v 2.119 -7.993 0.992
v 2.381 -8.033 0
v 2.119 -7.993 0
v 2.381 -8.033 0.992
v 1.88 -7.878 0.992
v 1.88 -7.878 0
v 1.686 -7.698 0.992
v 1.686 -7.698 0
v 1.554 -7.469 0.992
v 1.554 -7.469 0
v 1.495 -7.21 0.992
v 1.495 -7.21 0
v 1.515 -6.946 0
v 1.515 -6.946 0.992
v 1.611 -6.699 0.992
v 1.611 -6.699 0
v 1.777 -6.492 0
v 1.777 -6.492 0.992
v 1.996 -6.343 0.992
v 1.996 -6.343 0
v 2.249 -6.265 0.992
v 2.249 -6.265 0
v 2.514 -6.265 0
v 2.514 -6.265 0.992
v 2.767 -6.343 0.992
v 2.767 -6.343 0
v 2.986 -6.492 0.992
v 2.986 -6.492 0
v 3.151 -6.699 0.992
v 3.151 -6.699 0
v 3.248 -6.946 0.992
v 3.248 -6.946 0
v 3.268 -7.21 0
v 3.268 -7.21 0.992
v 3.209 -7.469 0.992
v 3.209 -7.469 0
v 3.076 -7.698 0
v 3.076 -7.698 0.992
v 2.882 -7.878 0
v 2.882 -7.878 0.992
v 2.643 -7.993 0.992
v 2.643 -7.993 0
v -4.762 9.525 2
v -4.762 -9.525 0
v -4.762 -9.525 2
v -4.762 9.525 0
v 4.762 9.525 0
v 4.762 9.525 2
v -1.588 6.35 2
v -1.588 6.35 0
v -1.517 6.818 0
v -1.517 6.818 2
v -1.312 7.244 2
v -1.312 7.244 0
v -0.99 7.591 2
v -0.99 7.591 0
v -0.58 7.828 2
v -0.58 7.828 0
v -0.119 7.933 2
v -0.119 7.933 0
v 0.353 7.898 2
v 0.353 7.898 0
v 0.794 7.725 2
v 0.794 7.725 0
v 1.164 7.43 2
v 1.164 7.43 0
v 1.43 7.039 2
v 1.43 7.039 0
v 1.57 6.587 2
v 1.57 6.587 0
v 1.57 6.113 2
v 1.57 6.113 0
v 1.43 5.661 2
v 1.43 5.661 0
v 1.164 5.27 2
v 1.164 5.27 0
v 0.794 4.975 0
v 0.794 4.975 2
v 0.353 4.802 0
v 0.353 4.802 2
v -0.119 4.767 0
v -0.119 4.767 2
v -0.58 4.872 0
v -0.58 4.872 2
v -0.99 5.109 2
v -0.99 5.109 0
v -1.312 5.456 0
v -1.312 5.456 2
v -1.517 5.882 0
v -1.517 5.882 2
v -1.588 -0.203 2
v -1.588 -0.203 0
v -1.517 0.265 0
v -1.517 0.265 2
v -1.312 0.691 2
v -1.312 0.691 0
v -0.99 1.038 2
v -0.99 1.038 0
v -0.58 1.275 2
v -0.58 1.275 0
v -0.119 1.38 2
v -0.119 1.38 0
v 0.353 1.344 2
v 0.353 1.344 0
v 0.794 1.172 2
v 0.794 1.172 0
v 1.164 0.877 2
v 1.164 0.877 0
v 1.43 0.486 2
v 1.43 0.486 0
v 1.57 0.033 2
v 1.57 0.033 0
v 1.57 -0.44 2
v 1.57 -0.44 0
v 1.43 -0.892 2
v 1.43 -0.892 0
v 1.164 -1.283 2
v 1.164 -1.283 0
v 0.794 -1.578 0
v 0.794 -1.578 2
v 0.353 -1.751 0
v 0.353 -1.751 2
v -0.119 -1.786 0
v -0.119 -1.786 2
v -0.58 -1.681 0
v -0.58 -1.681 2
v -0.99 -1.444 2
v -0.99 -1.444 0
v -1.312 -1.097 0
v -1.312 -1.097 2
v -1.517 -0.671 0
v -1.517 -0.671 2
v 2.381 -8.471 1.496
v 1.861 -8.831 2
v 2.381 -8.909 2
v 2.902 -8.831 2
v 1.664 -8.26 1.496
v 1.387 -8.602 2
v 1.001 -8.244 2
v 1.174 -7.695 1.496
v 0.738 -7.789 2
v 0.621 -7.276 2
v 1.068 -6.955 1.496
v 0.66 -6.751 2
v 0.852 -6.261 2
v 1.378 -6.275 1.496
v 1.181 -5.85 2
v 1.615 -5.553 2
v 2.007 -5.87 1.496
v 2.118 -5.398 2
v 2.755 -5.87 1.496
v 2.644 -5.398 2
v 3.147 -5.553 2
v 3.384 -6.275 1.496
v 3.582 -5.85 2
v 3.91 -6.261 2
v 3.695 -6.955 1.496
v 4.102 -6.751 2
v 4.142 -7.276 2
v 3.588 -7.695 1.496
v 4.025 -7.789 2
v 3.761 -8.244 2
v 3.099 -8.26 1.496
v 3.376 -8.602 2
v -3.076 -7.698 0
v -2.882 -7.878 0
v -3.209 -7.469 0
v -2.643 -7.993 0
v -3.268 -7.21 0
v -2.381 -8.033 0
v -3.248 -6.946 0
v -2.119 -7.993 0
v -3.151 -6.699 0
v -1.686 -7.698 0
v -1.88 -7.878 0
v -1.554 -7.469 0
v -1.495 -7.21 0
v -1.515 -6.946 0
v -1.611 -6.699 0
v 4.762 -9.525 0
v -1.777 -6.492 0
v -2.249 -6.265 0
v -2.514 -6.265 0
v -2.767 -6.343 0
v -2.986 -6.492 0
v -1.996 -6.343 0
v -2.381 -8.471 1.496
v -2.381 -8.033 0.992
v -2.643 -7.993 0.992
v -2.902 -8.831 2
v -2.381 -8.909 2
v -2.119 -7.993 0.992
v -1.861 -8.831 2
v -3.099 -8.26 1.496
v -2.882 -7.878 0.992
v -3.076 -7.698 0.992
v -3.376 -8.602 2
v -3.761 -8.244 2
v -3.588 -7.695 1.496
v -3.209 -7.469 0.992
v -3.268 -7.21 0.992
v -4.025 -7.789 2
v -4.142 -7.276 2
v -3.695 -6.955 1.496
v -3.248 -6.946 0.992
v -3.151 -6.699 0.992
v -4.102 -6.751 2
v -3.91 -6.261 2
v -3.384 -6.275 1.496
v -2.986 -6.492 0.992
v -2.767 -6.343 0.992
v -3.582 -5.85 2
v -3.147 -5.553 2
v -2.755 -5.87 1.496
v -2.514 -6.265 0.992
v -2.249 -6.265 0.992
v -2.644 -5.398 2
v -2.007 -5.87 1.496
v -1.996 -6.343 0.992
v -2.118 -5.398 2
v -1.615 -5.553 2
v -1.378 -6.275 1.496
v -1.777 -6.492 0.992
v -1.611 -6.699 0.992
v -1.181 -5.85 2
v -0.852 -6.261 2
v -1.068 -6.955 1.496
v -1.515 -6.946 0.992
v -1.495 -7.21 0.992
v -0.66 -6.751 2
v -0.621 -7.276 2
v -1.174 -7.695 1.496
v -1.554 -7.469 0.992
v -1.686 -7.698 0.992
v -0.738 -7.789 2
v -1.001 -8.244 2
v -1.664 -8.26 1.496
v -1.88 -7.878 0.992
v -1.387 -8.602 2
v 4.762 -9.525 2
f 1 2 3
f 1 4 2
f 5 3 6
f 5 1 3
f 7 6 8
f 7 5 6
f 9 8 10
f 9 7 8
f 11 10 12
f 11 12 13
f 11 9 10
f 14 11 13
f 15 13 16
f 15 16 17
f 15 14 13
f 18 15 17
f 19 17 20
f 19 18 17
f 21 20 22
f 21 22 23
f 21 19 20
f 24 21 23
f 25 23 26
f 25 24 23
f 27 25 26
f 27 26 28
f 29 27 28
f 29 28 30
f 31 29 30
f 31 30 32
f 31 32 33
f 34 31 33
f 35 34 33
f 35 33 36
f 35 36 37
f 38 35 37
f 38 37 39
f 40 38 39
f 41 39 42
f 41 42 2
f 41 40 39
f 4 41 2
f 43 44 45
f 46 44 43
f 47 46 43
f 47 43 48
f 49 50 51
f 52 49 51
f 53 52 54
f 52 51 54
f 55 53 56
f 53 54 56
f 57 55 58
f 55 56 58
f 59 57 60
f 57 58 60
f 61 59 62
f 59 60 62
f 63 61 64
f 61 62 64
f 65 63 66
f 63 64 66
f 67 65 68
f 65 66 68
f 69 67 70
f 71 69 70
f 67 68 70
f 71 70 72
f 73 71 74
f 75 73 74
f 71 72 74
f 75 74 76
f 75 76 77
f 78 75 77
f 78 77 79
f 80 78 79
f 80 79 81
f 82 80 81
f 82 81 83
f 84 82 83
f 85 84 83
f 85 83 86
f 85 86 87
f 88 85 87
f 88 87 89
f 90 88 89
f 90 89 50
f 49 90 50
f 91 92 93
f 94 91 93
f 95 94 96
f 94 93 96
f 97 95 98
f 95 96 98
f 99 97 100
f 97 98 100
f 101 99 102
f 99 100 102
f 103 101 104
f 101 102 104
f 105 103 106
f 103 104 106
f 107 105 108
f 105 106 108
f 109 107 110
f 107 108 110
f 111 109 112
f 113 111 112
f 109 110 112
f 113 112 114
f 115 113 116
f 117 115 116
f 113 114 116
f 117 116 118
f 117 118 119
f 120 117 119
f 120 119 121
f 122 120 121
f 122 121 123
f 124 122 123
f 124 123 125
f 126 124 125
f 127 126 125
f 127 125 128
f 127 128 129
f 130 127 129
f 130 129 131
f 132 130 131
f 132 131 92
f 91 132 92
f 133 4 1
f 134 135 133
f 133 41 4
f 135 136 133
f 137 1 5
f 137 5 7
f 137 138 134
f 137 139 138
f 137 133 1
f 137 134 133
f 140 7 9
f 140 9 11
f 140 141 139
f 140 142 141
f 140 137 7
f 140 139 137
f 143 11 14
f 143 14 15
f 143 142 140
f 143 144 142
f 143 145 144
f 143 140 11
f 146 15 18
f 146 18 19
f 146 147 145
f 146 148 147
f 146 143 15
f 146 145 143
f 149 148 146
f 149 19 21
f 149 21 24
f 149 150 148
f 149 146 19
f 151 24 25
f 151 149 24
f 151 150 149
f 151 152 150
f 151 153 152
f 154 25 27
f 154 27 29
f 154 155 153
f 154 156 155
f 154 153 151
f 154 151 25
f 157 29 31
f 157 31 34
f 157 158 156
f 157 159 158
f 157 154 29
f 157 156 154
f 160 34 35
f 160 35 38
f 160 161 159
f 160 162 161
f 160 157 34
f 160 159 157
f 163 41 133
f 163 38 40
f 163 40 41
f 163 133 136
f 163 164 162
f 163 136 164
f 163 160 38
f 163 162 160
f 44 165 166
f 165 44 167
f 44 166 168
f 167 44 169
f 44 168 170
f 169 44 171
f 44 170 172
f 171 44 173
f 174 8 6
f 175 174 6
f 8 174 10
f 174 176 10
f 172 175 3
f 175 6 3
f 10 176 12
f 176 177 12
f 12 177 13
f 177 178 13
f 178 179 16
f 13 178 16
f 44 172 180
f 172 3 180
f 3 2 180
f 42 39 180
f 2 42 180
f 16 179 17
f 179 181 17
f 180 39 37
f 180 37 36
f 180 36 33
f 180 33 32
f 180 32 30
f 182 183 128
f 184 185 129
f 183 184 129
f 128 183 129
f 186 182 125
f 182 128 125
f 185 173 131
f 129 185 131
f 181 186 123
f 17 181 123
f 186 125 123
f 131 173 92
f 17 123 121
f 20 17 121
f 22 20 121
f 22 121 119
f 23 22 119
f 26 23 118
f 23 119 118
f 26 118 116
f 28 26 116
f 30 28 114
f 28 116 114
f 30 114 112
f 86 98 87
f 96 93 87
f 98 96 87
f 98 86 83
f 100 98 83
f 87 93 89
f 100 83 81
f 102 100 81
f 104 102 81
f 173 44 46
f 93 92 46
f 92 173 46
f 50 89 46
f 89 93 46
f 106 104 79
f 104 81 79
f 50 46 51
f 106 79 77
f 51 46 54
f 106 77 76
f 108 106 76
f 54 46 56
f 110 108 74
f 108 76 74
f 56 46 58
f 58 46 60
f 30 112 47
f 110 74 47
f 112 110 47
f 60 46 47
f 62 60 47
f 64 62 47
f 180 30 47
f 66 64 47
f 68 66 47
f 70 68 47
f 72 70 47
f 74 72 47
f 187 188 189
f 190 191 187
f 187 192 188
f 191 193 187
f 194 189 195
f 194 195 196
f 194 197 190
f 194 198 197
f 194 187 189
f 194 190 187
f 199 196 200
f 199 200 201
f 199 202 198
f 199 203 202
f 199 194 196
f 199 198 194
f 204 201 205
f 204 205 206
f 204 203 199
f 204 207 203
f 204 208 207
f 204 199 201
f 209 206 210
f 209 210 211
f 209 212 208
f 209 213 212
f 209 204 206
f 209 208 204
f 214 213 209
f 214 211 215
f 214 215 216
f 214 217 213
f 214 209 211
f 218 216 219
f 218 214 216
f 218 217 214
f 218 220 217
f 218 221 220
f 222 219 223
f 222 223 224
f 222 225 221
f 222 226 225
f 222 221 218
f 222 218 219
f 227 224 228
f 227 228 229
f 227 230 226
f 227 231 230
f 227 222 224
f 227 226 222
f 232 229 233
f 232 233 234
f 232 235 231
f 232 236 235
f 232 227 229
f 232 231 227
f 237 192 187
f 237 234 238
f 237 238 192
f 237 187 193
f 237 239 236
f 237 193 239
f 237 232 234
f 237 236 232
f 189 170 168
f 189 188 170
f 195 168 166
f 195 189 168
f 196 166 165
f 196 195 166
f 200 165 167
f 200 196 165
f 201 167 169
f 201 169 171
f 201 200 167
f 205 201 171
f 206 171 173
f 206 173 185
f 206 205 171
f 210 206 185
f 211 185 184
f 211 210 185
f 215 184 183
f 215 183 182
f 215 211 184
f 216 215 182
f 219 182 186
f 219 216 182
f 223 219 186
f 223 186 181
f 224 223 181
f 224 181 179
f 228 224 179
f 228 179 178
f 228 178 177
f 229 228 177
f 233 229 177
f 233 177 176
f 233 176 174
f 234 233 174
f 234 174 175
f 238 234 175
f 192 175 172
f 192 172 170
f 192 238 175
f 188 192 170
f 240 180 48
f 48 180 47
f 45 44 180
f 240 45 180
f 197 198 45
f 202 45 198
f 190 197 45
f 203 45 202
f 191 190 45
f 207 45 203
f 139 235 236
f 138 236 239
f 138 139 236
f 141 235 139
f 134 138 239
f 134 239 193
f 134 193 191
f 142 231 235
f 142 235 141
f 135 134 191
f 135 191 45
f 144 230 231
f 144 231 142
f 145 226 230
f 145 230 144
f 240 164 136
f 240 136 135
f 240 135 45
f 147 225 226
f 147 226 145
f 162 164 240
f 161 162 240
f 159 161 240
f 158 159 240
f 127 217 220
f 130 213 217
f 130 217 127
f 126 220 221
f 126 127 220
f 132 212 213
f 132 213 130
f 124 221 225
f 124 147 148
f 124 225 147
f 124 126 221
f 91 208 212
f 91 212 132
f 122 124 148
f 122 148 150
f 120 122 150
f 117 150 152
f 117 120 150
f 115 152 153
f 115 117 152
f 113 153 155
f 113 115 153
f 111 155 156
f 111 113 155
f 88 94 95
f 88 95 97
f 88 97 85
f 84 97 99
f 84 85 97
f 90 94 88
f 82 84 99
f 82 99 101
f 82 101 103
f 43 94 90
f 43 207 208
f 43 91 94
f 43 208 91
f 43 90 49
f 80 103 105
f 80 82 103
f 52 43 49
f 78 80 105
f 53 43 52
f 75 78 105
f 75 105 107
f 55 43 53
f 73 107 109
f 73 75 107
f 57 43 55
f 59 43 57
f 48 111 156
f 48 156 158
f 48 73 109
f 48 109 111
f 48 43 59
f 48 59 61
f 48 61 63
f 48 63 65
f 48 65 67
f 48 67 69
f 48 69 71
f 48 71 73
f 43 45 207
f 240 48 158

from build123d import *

# Parameters (mm, degrees)
SKETCH1_W                                 = 9.525
SKETCH1_H                                 = 19.05
BOSS_EXTRUDE1_DEPTH                       = 2
CSK_FOR_0_FLAT_HEAD_MACHINE_SCREW_2_COUNT = 2
CSK_FOR_0_FLAT_HEAD_MACHINE_SCREW_2_PITCH = 4.7625
F_1_8_0_125_DIAMETER_HOLE1_D              = 3.175
F_1_8_0_125_DIAMETER_HOLE1_DEPTH          = 4.064
F_1_8_0_125_DIAMETER_HOLE1_TIP            = 0.953866233


with BuildPart() as part:
    # Sketch1 → Boss-Extrude1 (new body)
    with BuildSketch(Plane.XY):
        Rectangle(SKETCH1_W, SKETCH1_H)
    extrude(amount=BOSS_EXTRUDE1_DEPTH)

    # Sketch2 → CSK for #0 Flat Head Machine Screw (100)1 (revolve, cut)
    with BuildSketch(Plane(origin=(-2.38125, -7.14375, 2), x_dir=(0, -1, 0), z_dir=(1, 0, 0))):
        Polygon((0, 0), (0, 2), (0.889, 2), (0.889, 1.008067835), (1.7653, 0), align=None)
    csk_for_0_flat_head_machine_screw_100 = revolve(axis=Axis((-2.38125, -7.14375, 8.35), (0, 0, -1)), mode=Mode.SUBTRACT)

    # CSK for _0 Flat Head Machine Screw _ 2: CSK for #0 Flat Head Machine Screw (100)1 ×2
    with Locations(*[(i * CSK_FOR_0_FLAT_HEAD_MACHINE_SCREW_2_PITCH, 0, 0) for i in range(1, CSK_FOR_0_FLAT_HEAD_MACHINE_SCREW_2_COUNT)]):
        add(csk_for_0_flat_head_machine_screw_100, mode=Mode.SUBTRACT)

    # 1/8 (0.125) Diameter Hole1
    with Locations(Plane.XY.offset(2)):
        with Locations((0, 6.35), (0, -0.2032)):
            Hole(F_1_8_0_125_DIAMETER_HOLE1_D / 2, depth=F_1_8_0_125_DIAMETER_HOLE1_DEPTH)
            with Locations((0, 0, -(F_1_8_0_125_DIAMETER_HOLE1_DEPTH + F_1_8_0_125_DIAMETER_HOLE1_TIP / 2))):  # 118° drill point
                Cone(0, F_1_8_0_125_DIAMETER_HOLE1_D / 2, F_1_8_0_125_DIAMETER_HOLE1_TIP, mode=Mode.SUBTRACT)


solid = part.part
